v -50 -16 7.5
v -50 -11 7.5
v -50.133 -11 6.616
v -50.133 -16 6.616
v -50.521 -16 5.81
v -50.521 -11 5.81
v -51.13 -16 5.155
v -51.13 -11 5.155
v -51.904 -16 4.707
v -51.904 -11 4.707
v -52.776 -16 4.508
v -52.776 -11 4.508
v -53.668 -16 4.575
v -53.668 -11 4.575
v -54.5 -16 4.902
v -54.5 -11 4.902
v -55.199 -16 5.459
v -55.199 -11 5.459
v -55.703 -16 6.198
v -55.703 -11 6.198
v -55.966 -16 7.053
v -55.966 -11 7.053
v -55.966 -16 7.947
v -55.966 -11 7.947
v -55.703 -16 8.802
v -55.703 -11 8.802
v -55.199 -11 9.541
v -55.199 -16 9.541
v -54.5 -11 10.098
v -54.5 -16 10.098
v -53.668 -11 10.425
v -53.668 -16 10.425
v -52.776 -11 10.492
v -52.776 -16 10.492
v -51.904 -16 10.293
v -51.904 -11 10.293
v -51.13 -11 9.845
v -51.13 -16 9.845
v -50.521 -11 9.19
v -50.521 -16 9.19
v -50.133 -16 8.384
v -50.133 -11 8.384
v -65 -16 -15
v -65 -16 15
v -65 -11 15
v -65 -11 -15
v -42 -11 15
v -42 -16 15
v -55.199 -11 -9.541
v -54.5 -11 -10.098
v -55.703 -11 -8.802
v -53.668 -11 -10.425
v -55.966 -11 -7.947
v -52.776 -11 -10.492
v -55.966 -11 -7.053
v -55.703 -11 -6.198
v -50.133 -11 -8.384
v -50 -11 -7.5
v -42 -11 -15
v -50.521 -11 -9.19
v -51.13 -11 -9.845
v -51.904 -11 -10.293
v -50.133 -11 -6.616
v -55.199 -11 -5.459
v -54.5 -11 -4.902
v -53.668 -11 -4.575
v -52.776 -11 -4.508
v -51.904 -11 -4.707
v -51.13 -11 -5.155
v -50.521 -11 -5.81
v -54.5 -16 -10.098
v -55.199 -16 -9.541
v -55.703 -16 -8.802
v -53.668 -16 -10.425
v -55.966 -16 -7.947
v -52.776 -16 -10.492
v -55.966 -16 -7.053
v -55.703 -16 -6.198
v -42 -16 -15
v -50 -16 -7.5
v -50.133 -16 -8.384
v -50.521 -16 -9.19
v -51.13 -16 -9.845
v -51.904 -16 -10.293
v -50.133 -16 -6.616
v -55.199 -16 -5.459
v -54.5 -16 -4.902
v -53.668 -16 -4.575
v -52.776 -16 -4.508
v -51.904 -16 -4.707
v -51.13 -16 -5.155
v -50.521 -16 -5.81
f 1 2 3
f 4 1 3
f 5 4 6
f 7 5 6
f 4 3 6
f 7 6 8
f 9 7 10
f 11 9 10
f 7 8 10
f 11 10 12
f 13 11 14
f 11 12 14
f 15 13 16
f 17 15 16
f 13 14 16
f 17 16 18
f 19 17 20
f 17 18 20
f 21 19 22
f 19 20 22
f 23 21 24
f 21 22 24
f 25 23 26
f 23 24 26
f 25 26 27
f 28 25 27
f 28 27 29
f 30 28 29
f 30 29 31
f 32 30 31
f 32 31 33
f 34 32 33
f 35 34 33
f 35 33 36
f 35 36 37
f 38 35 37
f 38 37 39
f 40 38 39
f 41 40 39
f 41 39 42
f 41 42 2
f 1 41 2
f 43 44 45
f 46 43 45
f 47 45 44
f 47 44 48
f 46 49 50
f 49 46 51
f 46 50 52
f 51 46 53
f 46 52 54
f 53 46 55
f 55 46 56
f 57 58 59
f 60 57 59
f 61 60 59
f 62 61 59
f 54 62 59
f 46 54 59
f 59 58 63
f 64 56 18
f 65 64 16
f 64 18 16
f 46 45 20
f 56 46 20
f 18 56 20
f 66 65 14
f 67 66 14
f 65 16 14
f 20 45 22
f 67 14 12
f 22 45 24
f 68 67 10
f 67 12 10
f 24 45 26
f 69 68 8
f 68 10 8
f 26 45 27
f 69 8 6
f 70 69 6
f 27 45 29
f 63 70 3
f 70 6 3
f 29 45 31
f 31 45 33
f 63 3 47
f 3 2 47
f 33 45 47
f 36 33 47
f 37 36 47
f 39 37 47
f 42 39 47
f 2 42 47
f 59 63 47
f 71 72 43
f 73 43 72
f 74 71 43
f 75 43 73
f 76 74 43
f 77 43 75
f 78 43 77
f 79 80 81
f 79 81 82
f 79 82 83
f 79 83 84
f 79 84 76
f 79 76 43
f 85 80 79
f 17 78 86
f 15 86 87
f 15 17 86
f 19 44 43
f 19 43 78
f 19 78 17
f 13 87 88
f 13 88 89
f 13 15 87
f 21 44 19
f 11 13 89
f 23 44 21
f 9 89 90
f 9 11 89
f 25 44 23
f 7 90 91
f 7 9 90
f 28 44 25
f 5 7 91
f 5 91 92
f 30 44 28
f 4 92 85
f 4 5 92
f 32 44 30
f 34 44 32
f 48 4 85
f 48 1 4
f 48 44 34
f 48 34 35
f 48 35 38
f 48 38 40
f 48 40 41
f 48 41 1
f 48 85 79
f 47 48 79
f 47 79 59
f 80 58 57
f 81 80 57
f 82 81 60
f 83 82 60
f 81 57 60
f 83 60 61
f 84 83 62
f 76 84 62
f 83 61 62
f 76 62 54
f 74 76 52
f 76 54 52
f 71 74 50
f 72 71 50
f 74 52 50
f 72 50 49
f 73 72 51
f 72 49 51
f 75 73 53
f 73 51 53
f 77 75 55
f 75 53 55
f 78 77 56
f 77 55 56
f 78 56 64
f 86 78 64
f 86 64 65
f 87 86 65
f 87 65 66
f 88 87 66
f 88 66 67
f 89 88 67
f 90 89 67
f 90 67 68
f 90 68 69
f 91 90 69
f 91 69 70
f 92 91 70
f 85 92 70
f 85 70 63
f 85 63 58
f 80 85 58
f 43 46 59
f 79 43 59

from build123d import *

# Parameters (mm, degrees)
SKIZZE3_W                            = 23
SKIZZE3_H                            = 5
AUFSATZ_LINEAR_AUSTRAGEN1_DEPTH      = 15
AUFSATZ_LINEAR_AUSTRAGEN1_DEPTH_BACK = 15
SKIZZE5_R                            = 3
SCHNITT_LINEAR_AUSTRAGEN1_DEPTH      = 16


with BuildPart() as part:
    # Skizze3 → Aufsatz-Linear austragen1 (new body, two sides)
    with BuildSketch(Plane.XY) as aufsatz_linear_austragen1_sk:
        with Locations((-53.5, -13.5)):
            Rectangle(SKIZZE3_W, SKIZZE3_H)
    extrude(amount=AUFSATZ_LINEAR_AUSTRAGEN1_DEPTH)
    extrude(aufsatz_linear_austragen1_sk.sketch, amount=-AUFSATZ_LINEAR_AUSTRAGEN1_DEPTH_BACK)

    # Skizze5 → Schnitt-Linear austragen1 (cut)
    with BuildSketch(Plane(origin=(0, 0, 0), x_dir=(1, 0, 0), z_dir=(0, 1, 0))):
        with Locations((-53, 7.5)):
            Circle(SKIZZE5_R)
        with Locations((-53, -7.5)):
            Circle(SKIZZE5_R)
    extrude(amount=-SCHNITT_LINEAR_AUSTRAGEN1_DEPTH, mode=Mode.SUBTRACT)


solid = part.part
